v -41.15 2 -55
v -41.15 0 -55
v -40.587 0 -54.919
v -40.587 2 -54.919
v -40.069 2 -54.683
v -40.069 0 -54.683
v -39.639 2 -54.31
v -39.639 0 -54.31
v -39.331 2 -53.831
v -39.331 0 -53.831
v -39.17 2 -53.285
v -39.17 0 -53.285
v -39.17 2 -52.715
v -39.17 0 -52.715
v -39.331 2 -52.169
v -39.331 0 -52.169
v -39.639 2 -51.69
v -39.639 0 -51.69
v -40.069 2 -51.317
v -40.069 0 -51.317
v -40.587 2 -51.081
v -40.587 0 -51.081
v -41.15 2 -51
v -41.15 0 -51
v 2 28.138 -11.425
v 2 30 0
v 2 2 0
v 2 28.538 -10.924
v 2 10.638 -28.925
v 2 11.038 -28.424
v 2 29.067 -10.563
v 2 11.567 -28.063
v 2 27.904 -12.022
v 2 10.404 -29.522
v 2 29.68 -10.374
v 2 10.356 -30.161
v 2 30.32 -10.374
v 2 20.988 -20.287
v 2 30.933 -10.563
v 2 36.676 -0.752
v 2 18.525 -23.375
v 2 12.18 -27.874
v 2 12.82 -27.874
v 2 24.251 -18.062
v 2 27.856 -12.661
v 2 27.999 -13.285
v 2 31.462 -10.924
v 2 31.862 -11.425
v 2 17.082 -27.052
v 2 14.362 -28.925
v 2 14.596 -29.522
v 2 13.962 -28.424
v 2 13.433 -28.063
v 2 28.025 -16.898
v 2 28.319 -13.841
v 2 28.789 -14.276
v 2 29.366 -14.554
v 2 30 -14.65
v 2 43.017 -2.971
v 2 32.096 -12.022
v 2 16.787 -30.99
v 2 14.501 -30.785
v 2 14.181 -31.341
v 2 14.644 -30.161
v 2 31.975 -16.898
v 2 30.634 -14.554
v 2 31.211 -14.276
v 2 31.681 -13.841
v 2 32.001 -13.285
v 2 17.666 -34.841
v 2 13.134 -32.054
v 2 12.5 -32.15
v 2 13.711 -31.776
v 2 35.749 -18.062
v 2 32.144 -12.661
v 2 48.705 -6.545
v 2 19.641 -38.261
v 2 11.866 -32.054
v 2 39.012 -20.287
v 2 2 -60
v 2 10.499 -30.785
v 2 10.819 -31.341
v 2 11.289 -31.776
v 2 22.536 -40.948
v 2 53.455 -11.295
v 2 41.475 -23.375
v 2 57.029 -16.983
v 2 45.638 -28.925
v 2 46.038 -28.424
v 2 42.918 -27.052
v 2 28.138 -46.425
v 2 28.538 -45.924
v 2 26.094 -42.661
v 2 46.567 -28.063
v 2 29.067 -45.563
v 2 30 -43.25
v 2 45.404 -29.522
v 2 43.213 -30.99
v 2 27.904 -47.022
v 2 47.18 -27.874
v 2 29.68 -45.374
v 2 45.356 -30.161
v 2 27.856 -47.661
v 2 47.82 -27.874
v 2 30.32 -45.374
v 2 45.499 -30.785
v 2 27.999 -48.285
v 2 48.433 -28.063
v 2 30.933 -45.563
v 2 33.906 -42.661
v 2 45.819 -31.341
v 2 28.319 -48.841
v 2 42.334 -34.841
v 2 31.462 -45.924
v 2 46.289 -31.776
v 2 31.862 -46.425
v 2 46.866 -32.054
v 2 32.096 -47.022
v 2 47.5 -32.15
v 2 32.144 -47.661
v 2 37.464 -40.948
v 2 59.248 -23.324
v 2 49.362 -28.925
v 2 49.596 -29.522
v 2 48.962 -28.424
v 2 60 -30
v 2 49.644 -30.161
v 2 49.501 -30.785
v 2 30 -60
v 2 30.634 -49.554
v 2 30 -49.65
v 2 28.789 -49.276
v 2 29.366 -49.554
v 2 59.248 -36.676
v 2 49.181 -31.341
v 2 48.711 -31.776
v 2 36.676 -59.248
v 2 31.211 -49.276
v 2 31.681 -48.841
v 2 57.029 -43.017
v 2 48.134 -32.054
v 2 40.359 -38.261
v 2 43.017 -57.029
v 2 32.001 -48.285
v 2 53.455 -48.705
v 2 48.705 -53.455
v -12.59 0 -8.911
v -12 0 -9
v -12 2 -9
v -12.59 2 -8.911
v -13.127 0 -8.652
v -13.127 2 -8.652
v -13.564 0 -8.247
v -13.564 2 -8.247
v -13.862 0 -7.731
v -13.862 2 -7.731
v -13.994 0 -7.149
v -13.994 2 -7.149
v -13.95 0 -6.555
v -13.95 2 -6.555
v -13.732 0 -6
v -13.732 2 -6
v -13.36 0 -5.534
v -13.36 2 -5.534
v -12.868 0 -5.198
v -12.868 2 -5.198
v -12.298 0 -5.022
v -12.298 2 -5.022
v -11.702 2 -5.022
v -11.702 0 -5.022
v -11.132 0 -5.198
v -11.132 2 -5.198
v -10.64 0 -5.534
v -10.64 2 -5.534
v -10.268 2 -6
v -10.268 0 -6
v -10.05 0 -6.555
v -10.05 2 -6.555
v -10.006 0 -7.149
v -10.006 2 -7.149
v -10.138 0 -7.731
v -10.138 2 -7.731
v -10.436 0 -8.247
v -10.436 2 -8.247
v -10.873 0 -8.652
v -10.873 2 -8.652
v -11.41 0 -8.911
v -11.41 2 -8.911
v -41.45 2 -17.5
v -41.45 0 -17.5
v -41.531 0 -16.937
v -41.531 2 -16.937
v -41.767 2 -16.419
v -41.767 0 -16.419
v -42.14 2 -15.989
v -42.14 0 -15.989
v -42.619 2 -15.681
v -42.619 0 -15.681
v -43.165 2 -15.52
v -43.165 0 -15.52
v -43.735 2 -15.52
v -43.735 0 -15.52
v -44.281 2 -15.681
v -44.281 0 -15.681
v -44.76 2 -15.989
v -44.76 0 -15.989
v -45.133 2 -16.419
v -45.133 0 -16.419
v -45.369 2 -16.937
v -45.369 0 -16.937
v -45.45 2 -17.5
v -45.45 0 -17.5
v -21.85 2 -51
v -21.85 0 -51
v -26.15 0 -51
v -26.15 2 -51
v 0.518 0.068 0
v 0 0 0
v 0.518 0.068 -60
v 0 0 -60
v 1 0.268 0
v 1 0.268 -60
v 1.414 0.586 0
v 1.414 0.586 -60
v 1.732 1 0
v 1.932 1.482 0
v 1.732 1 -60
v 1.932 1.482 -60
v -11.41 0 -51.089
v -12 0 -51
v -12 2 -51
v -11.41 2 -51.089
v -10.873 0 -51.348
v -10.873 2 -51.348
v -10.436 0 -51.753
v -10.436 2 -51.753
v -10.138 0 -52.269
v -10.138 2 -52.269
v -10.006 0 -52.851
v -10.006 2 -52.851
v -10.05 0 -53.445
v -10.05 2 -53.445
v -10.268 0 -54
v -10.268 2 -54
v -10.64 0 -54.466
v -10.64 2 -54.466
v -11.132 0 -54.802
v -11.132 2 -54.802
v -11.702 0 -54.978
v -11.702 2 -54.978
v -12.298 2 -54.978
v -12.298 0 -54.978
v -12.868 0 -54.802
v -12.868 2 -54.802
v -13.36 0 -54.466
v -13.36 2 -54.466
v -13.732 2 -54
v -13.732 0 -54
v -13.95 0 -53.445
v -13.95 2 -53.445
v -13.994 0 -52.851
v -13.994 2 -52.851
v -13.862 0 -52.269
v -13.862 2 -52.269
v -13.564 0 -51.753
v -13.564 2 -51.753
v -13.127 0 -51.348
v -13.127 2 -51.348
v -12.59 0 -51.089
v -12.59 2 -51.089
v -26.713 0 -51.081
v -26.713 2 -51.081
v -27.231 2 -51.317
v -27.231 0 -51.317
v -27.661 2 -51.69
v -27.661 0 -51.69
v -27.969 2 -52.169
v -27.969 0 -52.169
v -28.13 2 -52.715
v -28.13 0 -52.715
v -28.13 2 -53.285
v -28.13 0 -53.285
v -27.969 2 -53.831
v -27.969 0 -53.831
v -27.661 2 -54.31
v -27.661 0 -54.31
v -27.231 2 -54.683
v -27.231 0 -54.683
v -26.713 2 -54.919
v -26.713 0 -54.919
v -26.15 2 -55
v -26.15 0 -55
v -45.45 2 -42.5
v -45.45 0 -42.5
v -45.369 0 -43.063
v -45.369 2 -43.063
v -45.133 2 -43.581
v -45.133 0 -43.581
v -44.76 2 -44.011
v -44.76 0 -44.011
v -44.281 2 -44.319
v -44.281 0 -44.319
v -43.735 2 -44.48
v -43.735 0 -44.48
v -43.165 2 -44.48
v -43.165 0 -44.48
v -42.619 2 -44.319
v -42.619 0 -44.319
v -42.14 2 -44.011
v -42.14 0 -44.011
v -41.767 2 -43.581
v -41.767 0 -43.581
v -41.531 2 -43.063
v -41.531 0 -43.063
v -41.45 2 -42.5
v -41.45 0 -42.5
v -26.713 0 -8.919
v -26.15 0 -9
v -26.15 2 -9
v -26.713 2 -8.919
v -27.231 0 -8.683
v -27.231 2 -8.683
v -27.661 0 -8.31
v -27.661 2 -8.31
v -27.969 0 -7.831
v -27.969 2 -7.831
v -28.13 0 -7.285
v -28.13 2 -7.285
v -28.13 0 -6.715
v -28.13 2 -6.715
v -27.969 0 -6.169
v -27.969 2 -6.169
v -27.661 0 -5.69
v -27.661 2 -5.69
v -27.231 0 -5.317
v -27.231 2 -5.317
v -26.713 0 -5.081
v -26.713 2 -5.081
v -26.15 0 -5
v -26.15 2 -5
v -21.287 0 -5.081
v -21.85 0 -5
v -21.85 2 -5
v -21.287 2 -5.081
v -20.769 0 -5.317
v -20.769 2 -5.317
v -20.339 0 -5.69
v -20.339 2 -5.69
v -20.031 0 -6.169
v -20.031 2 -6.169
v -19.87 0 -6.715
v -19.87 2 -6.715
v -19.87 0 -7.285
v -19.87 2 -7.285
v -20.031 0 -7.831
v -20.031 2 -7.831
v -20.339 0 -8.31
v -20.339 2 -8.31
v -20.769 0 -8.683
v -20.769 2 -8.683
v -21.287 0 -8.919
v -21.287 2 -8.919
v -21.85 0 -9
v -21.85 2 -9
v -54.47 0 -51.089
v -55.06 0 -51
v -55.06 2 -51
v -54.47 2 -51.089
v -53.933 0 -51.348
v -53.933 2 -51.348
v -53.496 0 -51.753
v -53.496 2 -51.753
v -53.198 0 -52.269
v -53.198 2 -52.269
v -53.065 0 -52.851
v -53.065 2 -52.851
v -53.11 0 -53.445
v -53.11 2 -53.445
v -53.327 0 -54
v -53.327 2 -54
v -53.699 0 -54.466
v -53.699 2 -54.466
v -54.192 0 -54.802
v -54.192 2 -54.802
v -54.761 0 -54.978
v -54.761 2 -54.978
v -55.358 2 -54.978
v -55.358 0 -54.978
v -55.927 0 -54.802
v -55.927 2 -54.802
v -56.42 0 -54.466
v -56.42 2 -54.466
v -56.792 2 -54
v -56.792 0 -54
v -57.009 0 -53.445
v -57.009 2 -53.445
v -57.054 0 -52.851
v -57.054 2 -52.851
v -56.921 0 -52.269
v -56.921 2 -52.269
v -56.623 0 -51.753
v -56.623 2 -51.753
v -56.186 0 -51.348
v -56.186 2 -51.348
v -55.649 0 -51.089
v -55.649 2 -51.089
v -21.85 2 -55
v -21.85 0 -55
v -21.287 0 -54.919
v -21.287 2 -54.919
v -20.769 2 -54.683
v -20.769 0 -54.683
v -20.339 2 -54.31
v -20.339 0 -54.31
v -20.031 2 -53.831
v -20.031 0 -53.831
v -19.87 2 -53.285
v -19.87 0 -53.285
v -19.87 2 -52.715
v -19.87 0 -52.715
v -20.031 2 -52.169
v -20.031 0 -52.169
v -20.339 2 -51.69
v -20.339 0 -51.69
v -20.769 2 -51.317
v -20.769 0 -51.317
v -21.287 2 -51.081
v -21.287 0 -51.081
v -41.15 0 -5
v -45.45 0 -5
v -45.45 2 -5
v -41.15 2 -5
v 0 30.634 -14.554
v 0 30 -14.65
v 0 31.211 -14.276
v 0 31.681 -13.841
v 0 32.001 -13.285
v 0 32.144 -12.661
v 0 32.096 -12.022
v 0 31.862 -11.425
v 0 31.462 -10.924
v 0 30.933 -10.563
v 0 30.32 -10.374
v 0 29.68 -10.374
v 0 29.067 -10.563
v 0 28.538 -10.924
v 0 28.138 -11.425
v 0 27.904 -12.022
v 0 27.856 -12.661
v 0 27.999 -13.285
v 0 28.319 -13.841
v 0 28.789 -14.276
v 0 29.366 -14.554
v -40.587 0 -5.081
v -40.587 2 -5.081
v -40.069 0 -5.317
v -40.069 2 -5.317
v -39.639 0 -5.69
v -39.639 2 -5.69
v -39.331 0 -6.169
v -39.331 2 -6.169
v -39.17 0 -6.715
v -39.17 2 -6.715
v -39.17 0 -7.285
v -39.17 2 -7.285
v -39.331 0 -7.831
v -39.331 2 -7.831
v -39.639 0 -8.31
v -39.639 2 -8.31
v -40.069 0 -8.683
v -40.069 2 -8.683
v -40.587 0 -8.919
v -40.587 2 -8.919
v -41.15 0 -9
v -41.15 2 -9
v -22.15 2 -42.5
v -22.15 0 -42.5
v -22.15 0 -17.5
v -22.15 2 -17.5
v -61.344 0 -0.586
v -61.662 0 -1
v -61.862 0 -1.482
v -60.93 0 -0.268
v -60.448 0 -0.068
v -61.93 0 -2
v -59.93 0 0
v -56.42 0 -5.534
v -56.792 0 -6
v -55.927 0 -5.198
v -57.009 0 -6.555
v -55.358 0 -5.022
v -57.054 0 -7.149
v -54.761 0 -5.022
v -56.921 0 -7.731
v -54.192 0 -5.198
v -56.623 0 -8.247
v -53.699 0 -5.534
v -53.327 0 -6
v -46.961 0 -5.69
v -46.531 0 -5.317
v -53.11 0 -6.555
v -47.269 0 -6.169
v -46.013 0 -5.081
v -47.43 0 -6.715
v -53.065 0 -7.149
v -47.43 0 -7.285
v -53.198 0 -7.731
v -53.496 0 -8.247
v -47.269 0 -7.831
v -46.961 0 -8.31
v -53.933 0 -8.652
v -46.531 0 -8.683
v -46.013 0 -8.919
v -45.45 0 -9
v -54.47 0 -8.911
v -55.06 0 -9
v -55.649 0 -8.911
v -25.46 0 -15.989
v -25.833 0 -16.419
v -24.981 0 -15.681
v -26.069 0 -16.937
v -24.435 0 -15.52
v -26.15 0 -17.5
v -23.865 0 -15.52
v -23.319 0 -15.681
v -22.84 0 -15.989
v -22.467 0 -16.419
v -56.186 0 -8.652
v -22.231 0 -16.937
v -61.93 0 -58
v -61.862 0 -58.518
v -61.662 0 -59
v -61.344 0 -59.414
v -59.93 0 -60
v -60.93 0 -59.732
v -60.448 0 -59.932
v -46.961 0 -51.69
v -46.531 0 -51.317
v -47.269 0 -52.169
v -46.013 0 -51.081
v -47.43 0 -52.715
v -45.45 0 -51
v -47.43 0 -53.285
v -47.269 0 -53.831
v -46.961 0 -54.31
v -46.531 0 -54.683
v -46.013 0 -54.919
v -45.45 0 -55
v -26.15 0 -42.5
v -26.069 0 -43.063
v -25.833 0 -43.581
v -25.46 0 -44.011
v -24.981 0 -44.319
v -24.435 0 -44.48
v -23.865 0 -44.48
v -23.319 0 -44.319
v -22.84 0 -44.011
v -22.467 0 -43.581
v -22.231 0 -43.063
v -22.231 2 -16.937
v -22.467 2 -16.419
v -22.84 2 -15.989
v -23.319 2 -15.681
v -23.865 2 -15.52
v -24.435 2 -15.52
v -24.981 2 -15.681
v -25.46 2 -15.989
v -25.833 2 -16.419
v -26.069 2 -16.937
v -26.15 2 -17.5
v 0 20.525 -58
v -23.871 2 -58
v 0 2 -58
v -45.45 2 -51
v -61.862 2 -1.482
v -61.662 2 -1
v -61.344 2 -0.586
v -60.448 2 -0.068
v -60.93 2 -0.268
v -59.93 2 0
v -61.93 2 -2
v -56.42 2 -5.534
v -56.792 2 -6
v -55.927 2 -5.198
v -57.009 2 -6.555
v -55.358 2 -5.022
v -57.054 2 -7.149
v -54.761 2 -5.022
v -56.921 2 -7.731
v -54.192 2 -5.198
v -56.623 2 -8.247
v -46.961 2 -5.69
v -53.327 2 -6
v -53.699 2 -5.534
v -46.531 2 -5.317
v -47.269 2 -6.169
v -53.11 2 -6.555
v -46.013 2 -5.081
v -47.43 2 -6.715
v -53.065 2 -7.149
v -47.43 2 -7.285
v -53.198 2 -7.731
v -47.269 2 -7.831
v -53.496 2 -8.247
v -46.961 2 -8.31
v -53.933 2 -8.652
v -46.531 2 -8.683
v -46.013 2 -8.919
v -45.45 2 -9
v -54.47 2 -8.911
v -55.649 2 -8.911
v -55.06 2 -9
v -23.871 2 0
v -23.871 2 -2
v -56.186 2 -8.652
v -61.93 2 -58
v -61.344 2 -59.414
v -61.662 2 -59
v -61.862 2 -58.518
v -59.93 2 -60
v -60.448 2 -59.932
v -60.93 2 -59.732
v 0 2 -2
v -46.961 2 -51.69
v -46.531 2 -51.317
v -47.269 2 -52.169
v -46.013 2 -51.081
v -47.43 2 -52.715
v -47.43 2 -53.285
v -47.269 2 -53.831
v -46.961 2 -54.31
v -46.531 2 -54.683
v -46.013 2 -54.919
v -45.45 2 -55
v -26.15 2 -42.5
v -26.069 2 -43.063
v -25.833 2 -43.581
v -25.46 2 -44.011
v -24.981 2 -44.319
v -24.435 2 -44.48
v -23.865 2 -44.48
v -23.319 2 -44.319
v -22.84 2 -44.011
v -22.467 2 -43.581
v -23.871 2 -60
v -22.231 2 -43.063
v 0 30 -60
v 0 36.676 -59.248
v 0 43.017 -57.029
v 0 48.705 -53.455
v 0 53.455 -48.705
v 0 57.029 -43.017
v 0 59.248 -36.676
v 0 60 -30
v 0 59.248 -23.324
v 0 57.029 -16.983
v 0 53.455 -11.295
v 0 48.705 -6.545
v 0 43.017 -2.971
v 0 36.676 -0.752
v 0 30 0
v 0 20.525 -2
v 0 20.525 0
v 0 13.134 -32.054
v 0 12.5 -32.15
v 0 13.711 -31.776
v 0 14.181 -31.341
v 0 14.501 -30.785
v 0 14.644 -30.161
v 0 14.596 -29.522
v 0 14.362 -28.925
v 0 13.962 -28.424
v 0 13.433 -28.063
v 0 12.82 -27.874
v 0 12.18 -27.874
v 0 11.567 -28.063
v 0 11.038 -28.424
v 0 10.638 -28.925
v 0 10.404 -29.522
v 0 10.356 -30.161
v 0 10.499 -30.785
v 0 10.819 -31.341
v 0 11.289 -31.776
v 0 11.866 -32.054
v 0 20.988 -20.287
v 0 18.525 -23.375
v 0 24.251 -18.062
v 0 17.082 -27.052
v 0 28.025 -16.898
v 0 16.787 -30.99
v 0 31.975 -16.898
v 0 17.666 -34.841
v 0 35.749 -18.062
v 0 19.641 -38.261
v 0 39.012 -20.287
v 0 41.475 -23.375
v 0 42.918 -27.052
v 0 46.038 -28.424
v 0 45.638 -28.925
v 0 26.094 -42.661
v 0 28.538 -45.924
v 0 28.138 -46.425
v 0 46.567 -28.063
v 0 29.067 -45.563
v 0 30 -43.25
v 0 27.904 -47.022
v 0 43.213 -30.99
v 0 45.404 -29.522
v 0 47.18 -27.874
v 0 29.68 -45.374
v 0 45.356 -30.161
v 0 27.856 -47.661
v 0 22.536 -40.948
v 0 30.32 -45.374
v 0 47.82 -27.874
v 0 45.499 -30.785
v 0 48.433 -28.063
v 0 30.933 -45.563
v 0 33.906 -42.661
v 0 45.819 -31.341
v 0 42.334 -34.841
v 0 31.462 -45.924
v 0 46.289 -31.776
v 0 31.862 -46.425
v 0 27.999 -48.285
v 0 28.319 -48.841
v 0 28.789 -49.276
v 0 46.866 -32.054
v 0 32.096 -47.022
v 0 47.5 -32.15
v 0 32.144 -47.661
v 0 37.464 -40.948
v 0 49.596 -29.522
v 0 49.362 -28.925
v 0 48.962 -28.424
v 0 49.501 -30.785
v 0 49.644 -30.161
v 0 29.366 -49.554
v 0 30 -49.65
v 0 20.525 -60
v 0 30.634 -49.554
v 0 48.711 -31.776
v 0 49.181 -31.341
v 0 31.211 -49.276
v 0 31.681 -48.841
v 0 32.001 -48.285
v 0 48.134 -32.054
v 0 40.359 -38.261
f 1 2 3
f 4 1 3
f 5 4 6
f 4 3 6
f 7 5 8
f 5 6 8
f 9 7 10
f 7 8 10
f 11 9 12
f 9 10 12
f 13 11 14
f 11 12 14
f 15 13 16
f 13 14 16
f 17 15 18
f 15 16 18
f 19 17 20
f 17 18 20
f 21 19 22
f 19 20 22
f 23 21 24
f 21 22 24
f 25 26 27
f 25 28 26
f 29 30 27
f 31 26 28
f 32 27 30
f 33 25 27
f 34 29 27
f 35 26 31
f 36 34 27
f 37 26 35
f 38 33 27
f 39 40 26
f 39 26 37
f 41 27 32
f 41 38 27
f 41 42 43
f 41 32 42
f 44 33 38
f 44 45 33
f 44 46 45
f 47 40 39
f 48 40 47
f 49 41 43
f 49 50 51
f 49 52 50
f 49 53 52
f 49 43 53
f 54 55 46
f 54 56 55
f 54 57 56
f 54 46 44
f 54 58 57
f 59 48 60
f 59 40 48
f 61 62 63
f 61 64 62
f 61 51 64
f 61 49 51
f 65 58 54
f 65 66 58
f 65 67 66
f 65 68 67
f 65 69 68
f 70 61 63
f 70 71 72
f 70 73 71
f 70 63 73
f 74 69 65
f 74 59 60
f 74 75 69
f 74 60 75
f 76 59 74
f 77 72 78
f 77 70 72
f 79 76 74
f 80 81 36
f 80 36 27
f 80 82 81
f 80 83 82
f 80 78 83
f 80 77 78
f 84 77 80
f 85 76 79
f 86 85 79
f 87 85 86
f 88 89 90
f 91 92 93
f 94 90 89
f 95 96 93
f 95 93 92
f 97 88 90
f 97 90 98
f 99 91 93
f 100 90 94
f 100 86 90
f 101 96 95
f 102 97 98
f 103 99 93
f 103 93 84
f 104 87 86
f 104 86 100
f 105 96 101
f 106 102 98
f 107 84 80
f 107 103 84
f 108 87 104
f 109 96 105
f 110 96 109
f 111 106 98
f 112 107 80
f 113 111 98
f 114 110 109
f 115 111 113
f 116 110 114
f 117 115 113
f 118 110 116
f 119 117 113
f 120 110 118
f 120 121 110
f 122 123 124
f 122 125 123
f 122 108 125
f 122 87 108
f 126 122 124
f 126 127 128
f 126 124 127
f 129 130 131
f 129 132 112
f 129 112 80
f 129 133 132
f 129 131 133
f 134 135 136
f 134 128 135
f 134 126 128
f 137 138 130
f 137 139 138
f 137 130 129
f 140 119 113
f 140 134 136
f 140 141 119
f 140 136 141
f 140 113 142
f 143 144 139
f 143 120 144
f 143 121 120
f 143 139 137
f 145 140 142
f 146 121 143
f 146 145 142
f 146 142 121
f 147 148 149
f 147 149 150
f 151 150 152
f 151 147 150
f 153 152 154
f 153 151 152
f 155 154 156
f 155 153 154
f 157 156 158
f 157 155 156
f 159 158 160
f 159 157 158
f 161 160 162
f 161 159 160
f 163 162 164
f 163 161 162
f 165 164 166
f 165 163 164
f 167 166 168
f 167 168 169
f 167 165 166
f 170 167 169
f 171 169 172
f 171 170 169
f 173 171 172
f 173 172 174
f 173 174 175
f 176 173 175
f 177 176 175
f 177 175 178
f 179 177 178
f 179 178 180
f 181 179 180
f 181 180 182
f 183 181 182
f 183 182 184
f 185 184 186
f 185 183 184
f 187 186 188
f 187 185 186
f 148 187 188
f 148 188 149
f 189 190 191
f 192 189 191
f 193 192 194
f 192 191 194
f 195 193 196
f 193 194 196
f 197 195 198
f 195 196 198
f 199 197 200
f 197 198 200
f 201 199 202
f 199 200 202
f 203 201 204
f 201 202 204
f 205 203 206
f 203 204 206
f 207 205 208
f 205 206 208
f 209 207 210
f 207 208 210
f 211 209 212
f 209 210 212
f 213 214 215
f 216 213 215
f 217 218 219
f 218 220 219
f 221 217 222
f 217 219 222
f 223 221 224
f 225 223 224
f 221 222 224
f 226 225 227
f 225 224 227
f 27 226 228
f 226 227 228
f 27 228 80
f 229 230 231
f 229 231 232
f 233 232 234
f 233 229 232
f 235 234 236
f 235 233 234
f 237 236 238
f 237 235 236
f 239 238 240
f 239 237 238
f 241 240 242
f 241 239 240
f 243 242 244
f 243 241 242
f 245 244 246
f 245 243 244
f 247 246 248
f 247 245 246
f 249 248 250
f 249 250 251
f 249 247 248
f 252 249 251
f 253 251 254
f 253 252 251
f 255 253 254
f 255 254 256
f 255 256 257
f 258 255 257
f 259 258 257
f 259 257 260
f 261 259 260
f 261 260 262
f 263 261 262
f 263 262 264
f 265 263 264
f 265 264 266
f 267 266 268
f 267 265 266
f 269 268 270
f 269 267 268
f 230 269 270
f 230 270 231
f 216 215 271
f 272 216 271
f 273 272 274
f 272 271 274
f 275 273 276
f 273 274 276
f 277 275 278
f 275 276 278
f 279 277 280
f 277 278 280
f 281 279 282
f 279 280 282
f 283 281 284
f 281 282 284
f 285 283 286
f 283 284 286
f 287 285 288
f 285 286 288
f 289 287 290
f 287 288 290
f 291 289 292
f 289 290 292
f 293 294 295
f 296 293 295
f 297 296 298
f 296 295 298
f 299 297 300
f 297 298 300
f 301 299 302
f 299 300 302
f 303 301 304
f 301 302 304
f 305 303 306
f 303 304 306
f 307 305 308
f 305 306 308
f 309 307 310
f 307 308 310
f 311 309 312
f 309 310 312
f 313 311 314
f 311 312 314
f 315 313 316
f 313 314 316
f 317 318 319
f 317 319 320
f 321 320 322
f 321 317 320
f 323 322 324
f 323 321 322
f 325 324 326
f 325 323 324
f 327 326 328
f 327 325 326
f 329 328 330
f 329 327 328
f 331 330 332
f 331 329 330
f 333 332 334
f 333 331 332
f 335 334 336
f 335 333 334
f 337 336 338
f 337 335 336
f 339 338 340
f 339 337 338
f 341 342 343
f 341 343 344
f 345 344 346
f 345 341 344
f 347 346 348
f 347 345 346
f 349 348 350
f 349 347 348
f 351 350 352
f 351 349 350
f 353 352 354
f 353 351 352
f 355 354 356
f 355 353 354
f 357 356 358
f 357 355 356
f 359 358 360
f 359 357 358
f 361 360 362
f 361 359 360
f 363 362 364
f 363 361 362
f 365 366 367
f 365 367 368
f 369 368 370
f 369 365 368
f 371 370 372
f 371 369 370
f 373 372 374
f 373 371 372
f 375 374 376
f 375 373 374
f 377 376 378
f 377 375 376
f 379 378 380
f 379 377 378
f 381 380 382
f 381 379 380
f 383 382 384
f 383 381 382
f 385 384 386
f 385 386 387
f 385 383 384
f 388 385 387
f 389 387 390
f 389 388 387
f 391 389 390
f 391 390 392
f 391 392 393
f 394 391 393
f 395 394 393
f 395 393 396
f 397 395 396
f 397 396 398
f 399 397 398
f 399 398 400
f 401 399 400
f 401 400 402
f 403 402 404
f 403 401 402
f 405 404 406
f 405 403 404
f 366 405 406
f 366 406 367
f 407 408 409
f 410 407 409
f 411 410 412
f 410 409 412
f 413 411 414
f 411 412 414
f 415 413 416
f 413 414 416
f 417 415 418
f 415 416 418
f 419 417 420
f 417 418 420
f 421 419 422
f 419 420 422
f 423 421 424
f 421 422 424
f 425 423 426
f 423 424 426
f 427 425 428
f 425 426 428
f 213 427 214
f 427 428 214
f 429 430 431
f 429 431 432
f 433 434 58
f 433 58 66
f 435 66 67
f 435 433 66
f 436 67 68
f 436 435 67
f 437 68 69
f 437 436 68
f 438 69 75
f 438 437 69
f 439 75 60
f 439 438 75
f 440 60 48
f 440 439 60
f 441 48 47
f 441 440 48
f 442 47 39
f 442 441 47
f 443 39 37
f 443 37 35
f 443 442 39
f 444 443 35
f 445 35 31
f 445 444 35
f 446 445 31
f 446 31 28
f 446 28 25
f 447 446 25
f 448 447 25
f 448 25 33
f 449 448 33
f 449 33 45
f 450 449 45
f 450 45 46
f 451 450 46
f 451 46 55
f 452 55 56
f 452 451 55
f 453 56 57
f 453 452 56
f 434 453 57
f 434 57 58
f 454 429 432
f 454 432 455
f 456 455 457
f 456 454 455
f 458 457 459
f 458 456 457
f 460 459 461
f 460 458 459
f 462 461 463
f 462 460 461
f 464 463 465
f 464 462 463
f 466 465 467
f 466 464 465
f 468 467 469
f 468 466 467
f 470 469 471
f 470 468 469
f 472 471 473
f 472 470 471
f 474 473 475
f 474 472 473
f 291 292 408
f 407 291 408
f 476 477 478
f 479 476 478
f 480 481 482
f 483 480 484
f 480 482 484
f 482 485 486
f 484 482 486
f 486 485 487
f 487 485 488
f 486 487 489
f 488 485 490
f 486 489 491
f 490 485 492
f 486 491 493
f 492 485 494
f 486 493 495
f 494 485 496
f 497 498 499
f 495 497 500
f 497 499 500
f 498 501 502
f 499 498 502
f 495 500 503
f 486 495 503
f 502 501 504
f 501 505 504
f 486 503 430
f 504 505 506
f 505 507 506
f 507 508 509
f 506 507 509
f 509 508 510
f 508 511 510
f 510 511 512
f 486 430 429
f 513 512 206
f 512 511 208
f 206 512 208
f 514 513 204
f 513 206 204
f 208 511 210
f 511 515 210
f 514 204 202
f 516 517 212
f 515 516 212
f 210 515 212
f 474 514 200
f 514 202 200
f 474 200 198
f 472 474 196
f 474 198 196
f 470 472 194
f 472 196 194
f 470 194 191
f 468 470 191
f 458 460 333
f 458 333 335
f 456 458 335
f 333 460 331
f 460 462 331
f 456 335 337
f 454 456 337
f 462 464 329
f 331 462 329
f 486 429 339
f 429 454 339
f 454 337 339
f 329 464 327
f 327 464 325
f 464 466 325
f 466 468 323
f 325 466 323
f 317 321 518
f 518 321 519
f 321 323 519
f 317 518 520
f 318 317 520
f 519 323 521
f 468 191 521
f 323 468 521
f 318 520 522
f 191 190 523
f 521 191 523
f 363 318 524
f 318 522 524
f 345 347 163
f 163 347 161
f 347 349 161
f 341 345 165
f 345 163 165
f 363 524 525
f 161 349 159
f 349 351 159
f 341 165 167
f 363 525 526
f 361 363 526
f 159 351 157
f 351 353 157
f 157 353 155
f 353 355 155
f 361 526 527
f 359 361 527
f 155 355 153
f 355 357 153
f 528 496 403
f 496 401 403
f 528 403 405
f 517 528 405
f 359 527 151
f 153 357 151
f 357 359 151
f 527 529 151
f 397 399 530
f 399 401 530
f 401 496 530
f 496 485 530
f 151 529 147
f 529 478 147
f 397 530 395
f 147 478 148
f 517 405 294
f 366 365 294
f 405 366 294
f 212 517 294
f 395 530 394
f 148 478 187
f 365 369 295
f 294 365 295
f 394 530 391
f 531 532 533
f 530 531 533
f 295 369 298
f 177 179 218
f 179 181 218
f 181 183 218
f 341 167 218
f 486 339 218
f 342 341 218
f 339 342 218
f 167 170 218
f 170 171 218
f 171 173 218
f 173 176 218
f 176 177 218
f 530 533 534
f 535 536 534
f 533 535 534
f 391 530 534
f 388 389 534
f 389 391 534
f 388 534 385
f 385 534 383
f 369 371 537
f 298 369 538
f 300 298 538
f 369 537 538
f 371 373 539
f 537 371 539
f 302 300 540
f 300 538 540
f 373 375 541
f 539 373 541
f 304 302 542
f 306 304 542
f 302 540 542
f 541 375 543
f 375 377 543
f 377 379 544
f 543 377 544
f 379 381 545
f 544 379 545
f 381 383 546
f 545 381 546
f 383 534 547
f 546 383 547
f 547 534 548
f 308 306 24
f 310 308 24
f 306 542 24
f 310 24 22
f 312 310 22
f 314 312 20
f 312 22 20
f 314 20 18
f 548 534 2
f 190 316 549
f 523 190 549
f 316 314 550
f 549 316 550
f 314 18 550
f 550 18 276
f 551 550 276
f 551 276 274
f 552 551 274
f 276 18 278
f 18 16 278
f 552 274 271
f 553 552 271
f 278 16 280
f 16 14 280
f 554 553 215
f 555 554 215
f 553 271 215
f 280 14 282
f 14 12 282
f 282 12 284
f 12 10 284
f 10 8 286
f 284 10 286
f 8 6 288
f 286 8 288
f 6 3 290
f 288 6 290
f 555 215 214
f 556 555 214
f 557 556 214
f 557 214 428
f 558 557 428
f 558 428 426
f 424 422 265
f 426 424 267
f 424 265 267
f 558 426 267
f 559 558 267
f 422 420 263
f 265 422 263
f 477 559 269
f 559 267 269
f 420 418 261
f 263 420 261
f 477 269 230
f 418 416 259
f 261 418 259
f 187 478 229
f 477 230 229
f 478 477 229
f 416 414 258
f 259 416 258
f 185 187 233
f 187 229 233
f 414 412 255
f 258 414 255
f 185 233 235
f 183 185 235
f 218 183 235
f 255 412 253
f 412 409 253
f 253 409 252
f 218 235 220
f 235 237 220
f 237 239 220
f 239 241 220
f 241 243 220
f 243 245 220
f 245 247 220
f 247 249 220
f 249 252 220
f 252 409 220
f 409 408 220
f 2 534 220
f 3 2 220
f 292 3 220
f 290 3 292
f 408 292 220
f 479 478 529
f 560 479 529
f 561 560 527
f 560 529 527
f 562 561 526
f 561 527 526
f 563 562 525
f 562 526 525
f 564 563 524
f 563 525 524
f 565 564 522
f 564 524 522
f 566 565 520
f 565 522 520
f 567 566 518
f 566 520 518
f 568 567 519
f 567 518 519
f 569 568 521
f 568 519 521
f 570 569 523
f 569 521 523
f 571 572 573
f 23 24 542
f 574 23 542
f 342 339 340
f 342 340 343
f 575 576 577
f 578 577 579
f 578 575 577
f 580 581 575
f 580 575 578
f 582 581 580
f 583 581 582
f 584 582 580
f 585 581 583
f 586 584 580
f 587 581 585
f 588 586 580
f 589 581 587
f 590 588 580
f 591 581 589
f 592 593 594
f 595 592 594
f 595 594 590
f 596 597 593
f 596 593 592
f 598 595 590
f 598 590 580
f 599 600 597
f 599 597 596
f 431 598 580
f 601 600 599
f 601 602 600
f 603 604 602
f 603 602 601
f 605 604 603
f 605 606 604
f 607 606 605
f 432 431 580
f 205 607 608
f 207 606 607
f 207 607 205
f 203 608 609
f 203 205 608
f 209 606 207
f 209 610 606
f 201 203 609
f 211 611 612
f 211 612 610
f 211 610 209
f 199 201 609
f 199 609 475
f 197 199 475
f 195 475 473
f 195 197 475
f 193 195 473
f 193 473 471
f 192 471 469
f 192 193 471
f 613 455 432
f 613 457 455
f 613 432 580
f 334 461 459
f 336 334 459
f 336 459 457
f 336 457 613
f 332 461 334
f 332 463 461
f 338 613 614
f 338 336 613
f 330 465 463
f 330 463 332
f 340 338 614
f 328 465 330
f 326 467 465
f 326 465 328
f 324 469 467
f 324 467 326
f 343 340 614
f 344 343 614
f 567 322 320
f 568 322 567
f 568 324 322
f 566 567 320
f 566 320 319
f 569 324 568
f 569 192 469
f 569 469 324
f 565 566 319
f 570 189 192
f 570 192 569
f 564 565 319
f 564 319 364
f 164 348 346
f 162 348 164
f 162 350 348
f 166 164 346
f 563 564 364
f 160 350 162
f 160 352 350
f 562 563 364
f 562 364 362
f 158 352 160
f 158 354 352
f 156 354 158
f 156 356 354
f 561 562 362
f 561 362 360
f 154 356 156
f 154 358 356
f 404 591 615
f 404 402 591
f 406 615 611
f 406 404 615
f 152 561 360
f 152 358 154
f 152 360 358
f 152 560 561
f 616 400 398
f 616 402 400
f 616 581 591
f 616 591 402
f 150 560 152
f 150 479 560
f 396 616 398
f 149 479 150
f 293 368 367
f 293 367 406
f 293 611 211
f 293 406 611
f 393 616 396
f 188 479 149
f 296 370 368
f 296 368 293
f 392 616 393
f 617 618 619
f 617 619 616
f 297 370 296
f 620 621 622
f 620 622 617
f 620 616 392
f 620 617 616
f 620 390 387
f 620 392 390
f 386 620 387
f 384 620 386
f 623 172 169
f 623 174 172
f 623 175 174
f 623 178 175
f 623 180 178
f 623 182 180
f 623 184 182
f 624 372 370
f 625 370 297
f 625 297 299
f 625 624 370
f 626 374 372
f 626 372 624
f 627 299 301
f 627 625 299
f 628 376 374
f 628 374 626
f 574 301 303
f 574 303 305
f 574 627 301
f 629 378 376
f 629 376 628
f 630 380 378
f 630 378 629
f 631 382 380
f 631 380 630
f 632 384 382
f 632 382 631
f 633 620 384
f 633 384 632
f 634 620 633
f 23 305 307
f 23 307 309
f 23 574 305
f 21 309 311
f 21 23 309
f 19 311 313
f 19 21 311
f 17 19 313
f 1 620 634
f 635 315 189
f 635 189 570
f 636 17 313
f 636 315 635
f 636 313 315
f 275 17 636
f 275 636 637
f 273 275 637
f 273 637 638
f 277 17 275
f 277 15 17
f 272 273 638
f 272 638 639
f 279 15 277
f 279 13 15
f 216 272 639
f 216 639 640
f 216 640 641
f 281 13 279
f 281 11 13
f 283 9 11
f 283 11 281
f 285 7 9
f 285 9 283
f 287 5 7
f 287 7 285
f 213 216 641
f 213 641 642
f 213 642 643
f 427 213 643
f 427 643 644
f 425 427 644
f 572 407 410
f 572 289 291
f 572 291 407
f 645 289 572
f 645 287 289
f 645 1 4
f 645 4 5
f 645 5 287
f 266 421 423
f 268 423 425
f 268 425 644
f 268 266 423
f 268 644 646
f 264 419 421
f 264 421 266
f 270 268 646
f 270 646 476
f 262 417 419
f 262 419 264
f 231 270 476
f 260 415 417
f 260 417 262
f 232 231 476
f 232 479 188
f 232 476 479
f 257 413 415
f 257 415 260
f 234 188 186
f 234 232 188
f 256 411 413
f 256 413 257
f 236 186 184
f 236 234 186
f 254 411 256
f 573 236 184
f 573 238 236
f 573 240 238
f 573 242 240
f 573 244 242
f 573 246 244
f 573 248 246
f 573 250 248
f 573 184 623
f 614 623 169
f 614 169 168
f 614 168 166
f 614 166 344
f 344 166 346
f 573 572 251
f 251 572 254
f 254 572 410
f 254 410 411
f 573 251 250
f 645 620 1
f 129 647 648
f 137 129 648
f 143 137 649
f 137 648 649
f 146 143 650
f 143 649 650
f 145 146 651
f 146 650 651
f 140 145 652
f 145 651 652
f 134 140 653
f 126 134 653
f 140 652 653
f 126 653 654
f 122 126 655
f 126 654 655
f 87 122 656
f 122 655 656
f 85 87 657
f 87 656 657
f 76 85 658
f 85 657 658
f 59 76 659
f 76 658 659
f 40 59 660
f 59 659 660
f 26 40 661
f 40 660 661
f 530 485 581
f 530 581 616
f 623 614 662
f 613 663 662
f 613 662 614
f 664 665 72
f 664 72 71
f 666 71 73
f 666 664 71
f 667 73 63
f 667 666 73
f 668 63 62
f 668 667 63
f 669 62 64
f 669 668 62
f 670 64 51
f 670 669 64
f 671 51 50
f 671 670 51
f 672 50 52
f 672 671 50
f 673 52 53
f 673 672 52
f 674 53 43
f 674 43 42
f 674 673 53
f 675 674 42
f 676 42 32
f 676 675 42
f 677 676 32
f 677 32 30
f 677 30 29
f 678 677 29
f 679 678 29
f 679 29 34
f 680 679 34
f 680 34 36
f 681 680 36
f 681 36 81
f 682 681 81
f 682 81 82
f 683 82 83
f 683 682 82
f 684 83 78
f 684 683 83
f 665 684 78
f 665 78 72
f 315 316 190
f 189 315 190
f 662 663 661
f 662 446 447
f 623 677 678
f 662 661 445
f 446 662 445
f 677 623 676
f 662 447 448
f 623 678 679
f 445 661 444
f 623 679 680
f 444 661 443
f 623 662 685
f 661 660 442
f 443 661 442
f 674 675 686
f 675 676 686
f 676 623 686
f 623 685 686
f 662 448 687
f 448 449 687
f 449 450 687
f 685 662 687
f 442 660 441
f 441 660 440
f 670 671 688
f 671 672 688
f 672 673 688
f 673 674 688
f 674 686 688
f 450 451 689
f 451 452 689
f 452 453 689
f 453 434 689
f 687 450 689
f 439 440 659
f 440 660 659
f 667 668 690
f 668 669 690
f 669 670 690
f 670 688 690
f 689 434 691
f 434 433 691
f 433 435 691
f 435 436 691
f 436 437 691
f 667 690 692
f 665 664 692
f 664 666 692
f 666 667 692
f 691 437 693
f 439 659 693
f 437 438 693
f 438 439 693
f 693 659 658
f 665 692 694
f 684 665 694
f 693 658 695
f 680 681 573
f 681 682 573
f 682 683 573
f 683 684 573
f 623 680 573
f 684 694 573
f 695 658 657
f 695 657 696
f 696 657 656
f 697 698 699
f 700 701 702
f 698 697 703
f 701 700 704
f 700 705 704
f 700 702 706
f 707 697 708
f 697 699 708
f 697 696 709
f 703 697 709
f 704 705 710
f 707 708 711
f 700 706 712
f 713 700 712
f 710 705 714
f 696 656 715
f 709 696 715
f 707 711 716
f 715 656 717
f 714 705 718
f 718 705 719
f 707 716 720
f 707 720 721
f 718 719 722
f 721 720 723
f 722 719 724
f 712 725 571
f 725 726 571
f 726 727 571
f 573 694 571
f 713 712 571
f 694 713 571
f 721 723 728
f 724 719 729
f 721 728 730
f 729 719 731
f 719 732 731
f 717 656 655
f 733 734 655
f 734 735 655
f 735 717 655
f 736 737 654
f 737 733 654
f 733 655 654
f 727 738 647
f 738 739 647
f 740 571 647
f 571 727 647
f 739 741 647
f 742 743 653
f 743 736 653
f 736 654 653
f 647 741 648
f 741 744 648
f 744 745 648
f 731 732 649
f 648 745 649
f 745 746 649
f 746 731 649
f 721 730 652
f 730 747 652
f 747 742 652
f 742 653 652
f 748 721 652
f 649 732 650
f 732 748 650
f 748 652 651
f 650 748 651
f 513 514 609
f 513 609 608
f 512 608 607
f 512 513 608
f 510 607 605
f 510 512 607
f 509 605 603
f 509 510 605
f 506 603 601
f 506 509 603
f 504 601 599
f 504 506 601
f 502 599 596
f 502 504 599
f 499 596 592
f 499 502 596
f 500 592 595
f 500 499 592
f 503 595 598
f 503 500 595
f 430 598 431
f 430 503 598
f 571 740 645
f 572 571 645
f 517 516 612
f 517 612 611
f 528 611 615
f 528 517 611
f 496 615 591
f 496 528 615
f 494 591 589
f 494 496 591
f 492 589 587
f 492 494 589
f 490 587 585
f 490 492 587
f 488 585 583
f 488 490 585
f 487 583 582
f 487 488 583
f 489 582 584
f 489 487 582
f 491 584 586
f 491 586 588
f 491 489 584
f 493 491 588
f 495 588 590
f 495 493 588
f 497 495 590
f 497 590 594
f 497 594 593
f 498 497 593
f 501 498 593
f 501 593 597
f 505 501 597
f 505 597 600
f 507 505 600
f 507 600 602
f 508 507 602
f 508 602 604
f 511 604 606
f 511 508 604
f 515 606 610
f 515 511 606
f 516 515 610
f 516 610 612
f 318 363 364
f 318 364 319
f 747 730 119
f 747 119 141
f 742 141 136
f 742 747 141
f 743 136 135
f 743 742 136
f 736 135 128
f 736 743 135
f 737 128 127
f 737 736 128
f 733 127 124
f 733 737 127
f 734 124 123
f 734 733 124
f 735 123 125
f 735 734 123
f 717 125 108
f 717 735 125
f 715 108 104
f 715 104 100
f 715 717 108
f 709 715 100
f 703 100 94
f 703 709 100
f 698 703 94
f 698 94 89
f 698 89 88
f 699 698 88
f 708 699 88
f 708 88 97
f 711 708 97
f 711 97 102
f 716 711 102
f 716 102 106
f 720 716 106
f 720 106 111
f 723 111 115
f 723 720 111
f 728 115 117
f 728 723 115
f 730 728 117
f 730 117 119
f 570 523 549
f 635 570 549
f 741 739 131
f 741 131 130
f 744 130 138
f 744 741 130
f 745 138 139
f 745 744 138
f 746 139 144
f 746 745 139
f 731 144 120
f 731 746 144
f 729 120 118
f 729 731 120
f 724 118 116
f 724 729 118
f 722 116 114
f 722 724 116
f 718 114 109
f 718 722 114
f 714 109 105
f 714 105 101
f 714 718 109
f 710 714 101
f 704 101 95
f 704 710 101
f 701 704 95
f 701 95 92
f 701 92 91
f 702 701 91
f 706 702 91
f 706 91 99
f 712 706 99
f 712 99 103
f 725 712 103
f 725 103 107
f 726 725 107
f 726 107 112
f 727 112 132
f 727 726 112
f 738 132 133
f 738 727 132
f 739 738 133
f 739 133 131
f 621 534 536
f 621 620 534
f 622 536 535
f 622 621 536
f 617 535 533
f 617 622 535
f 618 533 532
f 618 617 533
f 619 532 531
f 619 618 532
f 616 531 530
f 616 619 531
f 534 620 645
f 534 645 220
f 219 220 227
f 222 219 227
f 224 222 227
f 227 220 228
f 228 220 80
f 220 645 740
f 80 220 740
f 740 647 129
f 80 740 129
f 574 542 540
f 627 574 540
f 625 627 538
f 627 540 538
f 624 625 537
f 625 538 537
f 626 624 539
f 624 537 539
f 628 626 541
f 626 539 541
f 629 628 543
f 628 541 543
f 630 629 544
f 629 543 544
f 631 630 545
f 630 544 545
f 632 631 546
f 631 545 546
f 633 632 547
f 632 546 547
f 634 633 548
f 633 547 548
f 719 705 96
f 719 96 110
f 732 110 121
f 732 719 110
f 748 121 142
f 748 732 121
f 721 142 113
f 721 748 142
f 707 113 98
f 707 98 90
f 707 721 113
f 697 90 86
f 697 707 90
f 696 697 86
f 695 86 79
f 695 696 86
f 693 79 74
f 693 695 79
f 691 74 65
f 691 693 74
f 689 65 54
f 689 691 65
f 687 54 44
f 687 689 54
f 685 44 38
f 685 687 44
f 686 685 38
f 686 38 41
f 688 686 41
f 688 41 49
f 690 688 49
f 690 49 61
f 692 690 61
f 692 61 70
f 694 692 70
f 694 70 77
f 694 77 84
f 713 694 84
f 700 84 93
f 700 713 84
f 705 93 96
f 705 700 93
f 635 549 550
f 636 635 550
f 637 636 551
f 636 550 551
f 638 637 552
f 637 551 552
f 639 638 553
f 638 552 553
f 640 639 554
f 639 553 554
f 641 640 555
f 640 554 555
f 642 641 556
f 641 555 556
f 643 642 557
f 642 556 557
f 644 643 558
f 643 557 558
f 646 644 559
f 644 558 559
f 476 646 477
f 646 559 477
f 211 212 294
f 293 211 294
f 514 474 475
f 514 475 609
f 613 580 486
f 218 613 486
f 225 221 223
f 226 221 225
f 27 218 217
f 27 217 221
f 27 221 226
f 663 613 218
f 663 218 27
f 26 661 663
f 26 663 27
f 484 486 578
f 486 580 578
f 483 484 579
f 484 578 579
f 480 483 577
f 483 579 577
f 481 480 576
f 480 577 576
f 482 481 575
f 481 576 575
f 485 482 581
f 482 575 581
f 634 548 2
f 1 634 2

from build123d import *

# Parameters (mm, degrees)
SKETCH1_R           = 2.15
SKETCH1_R_2         = 13.25
BOSS_EXTRUDE1_DEPTH = 2
SKETCH2_W           = 63.93
SKETCH2_H           = 60
SKETCH2_R           = 2
BOSS_EXTRUDE2_DEPTH = 2
BOSS_EXTRUDE3_DEPTH = 2
BOSS_EXTRUDE4_DEPTH = 2
FILLET1_R           = 2


with BuildPart() as part:
    # Sketch1 → Boss-Extrude1 (new body)
    with BuildSketch(Plane(origin=(0, 0, 0), x_dir=(0, 0, -1), z_dir=(1, 0, 0))):
        with BuildLine():
            Line((0, 0), (60, 0))
            Line((60, 0), (60, 30))
            ThreePointArc((60, 30), (30, 60), (0, 30))
            Line((0, 30), (0, 0))
        make_face()
        with Locations((30, 47.5)):
            Circle(SKETCH1_R, mode=Mode.SUBTRACT)
        with Locations((30, 30)):
            Circle(SKETCH1_R_2, mode=Mode.SUBTRACT)
        with Locations((47.5, 30)):
            Circle(SKETCH1_R, mode=Mode.SUBTRACT)
        with Locations((30, 12.5)):
            Circle(SKETCH1_R, mode=Mode.SUBTRACT)
        with Locations((12.5, 30)):
            Circle(SKETCH1_R, mode=Mode.SUBTRACT)
    extrude(amount=BOSS_EXTRUDE1_DEPTH)

    # Sketch2 → Boss-Extrude2 (add)
    with BuildSketch(Plane(origin=(0, 0, 0), x_dir=(1, 0, 0), z_dir=(0, 1, 0))):
        with Locations((-29.965, 30)):
            Rectangle(SKETCH2_W, SKETCH2_H)
        with Locations(Location((-12, 53, 0), (0, 0, 270))):
            Circle(SKETCH2_R, mode=Mode.SUBTRACT)
        with Locations(Location((-55.059526056, 53, 0), (0, 0, 270))):
            Circle(SKETCH2_R, mode=Mode.SUBTRACT)
        with Locations(Location((-55.059526056, 7, 0), (0, 0, 90))):
            Circle(SKETCH2_R, mode=Mode.SUBTRACT)
        with Locations(Location((-12, 7, 0), (0, 0, 90))):
            Circle(SKETCH2_R, mode=Mode.SUBTRACT)
        with BuildLine():
            Line((-21.85, 51), (-26.15, 51))
            ThreePointArc((-26.15, 51), (-28.15, 53), (-26.15, 55))
            Line((-26.15, 55), (-21.85, 55))
            ThreePointArc((-21.85, 55), (-19.85, 53), (-21.85, 51))
        make_face(mode=Mode.SUBTRACT)
        with BuildLine():
            Line((-41.15, 51), (-45.45, 51))
            ThreePointArc((-45.45, 51), (-47.45, 53), (-45.45, 55))
            Line((-45.45, 55), (-41.15, 55))
            ThreePointArc((-41.15, 55), (-39.15, 53), (-41.15, 51))
        make_face(mode=Mode.SUBTRACT)
        with BuildLine():
            Line((-41.15, 9), (-45.45, 9))
            ThreePointArc((-45.45, 9), (-47.45, 7), (-45.45, 5))
            Line((-45.45, 5), (-41.15, 5))
            ThreePointArc((-41.15, 5), (-39.15, 7), (-41.15, 9))
        make_face(mode=Mode.SUBTRACT)
        with BuildLine():
            Line((-21.85, 9), (-26.15, 9))
            ThreePointArc((-26.15, 9), (-28.15, 7), (-26.15, 5))
            Line((-26.15, 5), (-21.85, 5))
            ThreePointArc((-21.85, 5), (-19.85, 7), (-21.85, 9))
        make_face(mode=Mode.SUBTRACT)
        with BuildLine():
            Line((-22.15, 42.5), (-22.15, 17.5))
            ThreePointArc((-22.15, 17.5), (-24.15, 15.5), (-26.15, 17.5))
            Line((-26.15, 17.5), (-26.15, 42.5))
            ThreePointArc((-26.15, 42.5), (-24.15, 44.5), (-22.15, 42.5))
        make_face(mode=Mode.SUBTRACT)
        with BuildLine():
            Line((-41.45, 42.5), (-41.45, 17.5))
            ThreePointArc((-41.45, 17.5), (-43.45, 15.5), (-45.45, 17.5))
            Line((-45.45, 17.5), (-45.45, 42.5))
            ThreePointArc((-45.45, 42.5), (-43.45, 44.5), (-41.45, 42.5))
        make_face(mode=Mode.SUBTRACT)
    extrude(amount=BOSS_EXTRUDE2_DEPTH)

    # Sketch3 → Boss-Extrude3 (add)
    with BuildSketch(Plane(origin=(0, 0, -60), x_dir=(-1, 0, 0), z_dir=(0, 0, -1))):
        Polygon((0, 20.525104105), (23.871014094, 2), (0, 2), align=None)
    extrude(amount=-BOSS_EXTRUDE3_DEPTH)

    # Sketch4 → Boss-Extrude4 (add)
    with BuildSketch(Plane.XY):
        Polygon((0, 20.525104105), (-23.871014094, 2), (0, 2), align=None)
    extrude(amount=-BOSS_EXTRUDE4_DEPTH)

    # Fillet1
    fillet1_edges = [part.edges().sort_by_distance(p)[0] for p in [
        (-61.93, 1, 0),
        (-61.93, 1, -60),
        (2, 0, -30),
    ]]
    fillet(fillet1_edges, radius=FILLET1_R)


solid = part.part
